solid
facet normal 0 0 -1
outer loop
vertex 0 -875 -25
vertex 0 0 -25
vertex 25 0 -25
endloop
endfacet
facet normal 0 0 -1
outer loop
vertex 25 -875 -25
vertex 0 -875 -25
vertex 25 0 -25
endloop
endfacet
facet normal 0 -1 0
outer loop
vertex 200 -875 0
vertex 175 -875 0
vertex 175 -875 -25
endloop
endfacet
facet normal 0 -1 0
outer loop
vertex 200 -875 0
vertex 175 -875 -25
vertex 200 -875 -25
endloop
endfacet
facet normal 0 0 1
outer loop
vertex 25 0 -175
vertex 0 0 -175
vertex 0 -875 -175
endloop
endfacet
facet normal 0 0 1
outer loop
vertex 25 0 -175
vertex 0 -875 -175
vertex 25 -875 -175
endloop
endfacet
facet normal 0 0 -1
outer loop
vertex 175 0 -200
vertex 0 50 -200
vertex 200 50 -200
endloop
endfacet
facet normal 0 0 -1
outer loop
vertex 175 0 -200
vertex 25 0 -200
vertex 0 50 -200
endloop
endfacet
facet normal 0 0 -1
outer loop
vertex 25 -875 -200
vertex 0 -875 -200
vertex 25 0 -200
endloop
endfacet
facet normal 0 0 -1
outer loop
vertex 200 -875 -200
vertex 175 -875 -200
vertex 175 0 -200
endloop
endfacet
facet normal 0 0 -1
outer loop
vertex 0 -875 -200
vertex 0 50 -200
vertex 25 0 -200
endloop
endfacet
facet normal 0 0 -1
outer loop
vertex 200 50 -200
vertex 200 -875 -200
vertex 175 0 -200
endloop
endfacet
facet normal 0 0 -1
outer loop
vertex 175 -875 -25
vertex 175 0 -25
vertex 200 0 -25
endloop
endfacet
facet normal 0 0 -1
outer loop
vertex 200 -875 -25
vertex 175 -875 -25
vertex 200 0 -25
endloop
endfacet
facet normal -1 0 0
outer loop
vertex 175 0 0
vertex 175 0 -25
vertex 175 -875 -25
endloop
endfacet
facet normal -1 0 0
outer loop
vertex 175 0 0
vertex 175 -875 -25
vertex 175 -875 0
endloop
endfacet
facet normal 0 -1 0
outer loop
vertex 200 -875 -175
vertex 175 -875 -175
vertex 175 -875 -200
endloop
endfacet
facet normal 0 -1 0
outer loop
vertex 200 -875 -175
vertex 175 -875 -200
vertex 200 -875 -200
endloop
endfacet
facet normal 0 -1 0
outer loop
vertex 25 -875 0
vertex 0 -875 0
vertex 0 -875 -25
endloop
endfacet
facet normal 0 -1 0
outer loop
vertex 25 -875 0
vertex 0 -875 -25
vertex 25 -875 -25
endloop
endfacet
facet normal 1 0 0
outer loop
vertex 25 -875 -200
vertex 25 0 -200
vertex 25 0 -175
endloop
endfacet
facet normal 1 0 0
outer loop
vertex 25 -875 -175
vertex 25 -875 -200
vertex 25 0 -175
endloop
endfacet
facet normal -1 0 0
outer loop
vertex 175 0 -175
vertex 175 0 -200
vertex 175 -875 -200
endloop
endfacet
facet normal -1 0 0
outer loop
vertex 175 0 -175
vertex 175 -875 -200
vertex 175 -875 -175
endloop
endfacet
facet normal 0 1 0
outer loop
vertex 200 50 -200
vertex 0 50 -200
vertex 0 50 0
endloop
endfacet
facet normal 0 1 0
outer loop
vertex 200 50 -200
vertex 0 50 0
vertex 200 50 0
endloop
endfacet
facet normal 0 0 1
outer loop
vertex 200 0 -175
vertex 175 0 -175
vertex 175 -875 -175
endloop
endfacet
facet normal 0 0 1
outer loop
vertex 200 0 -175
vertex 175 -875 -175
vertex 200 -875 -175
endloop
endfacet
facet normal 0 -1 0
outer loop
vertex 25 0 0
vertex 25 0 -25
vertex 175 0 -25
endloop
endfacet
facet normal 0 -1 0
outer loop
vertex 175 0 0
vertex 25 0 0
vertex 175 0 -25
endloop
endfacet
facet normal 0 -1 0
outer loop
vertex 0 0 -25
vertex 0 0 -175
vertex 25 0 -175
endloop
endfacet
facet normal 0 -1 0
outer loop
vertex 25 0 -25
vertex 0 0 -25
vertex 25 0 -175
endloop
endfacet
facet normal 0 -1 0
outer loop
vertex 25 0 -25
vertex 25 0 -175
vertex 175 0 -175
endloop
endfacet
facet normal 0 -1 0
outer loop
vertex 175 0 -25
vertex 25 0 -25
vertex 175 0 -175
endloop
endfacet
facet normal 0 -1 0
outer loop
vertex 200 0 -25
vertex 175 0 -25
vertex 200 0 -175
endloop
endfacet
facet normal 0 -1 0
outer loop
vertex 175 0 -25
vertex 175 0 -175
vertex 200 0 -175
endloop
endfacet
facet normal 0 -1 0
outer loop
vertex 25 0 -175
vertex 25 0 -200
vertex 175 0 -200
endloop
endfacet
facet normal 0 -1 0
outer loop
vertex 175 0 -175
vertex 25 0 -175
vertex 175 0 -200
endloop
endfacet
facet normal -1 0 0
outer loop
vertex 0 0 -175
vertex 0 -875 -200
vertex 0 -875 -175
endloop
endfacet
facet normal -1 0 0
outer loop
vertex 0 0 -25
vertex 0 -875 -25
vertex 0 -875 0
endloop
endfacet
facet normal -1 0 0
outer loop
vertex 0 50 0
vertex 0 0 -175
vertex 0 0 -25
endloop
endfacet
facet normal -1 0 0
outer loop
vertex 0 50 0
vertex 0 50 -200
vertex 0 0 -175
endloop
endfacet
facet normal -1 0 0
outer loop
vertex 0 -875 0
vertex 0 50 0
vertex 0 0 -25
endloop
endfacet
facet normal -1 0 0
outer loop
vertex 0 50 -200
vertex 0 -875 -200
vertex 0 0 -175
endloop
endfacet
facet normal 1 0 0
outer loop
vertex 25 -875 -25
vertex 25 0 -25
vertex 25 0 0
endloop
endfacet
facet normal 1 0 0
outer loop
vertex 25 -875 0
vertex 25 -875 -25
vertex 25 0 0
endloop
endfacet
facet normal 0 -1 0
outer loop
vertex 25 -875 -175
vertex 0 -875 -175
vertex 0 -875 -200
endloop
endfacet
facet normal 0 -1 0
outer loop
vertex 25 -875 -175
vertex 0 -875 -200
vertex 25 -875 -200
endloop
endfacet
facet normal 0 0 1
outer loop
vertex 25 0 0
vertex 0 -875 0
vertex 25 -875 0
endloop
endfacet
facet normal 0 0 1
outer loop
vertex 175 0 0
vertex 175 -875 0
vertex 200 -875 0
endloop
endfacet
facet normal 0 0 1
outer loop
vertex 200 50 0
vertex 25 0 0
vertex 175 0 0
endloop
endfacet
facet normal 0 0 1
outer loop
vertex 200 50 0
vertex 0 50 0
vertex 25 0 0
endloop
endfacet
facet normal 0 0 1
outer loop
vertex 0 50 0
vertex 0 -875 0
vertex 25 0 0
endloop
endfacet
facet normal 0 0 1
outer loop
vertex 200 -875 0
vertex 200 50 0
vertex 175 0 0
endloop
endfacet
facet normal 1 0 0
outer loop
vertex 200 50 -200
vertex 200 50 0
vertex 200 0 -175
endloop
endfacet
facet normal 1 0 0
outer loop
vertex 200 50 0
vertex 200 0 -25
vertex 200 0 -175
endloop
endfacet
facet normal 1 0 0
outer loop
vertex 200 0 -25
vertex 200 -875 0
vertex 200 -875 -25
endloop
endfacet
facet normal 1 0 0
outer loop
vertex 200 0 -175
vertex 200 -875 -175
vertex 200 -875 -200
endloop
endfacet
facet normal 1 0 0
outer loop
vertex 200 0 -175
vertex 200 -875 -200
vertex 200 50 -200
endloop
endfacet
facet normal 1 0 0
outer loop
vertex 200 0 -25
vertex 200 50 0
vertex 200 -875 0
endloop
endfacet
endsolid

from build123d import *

# Parameters (mm, degrees)
CROQUIS1_W              = 200
CROQUIS1_H              = 200
SALIENTE_EXTRUIR1_DEPTH = 50
CROQUIS2_W              = 25
CROQUIS2_H              = 25
SALIENTE_EXTRUIR2_DEPTH = 875


with BuildPart() as part:
    # Croquis1 → Saliente-Extruir1 (new body)
    with BuildSketch(Plane(origin=(0, 0, 0), x_dir=(1, 0, 0), z_dir=(0, 1, 0))):
        with Locations((100, 100)):
            Rectangle(CROQUIS1_W, CROQUIS1_H)
    extrude(amount=SALIENTE_EXTRUIR1_DEPTH)

    # Croquis2 → Saliente-Extruir2 (add)
    with BuildSketch(Plane.XZ):
        with Locations((12.5, -12.5)):
            Rectangle(CROQUIS2_W, CROQUIS2_H)
        with Locations((187.5, -12.5)):
            Rectangle(CROQUIS2_W, CROQUIS2_H)
        with Locations((12.5, -187.5)):
            Rectangle(CROQUIS2_W, CROQUIS2_H)
        with Locations((187.5, -187.5)):
            Rectangle(CROQUIS2_W, CROQUIS2_H)
    extrude(amount=SALIENTE_EXTRUIR2_DEPTH)


solid = part.part
